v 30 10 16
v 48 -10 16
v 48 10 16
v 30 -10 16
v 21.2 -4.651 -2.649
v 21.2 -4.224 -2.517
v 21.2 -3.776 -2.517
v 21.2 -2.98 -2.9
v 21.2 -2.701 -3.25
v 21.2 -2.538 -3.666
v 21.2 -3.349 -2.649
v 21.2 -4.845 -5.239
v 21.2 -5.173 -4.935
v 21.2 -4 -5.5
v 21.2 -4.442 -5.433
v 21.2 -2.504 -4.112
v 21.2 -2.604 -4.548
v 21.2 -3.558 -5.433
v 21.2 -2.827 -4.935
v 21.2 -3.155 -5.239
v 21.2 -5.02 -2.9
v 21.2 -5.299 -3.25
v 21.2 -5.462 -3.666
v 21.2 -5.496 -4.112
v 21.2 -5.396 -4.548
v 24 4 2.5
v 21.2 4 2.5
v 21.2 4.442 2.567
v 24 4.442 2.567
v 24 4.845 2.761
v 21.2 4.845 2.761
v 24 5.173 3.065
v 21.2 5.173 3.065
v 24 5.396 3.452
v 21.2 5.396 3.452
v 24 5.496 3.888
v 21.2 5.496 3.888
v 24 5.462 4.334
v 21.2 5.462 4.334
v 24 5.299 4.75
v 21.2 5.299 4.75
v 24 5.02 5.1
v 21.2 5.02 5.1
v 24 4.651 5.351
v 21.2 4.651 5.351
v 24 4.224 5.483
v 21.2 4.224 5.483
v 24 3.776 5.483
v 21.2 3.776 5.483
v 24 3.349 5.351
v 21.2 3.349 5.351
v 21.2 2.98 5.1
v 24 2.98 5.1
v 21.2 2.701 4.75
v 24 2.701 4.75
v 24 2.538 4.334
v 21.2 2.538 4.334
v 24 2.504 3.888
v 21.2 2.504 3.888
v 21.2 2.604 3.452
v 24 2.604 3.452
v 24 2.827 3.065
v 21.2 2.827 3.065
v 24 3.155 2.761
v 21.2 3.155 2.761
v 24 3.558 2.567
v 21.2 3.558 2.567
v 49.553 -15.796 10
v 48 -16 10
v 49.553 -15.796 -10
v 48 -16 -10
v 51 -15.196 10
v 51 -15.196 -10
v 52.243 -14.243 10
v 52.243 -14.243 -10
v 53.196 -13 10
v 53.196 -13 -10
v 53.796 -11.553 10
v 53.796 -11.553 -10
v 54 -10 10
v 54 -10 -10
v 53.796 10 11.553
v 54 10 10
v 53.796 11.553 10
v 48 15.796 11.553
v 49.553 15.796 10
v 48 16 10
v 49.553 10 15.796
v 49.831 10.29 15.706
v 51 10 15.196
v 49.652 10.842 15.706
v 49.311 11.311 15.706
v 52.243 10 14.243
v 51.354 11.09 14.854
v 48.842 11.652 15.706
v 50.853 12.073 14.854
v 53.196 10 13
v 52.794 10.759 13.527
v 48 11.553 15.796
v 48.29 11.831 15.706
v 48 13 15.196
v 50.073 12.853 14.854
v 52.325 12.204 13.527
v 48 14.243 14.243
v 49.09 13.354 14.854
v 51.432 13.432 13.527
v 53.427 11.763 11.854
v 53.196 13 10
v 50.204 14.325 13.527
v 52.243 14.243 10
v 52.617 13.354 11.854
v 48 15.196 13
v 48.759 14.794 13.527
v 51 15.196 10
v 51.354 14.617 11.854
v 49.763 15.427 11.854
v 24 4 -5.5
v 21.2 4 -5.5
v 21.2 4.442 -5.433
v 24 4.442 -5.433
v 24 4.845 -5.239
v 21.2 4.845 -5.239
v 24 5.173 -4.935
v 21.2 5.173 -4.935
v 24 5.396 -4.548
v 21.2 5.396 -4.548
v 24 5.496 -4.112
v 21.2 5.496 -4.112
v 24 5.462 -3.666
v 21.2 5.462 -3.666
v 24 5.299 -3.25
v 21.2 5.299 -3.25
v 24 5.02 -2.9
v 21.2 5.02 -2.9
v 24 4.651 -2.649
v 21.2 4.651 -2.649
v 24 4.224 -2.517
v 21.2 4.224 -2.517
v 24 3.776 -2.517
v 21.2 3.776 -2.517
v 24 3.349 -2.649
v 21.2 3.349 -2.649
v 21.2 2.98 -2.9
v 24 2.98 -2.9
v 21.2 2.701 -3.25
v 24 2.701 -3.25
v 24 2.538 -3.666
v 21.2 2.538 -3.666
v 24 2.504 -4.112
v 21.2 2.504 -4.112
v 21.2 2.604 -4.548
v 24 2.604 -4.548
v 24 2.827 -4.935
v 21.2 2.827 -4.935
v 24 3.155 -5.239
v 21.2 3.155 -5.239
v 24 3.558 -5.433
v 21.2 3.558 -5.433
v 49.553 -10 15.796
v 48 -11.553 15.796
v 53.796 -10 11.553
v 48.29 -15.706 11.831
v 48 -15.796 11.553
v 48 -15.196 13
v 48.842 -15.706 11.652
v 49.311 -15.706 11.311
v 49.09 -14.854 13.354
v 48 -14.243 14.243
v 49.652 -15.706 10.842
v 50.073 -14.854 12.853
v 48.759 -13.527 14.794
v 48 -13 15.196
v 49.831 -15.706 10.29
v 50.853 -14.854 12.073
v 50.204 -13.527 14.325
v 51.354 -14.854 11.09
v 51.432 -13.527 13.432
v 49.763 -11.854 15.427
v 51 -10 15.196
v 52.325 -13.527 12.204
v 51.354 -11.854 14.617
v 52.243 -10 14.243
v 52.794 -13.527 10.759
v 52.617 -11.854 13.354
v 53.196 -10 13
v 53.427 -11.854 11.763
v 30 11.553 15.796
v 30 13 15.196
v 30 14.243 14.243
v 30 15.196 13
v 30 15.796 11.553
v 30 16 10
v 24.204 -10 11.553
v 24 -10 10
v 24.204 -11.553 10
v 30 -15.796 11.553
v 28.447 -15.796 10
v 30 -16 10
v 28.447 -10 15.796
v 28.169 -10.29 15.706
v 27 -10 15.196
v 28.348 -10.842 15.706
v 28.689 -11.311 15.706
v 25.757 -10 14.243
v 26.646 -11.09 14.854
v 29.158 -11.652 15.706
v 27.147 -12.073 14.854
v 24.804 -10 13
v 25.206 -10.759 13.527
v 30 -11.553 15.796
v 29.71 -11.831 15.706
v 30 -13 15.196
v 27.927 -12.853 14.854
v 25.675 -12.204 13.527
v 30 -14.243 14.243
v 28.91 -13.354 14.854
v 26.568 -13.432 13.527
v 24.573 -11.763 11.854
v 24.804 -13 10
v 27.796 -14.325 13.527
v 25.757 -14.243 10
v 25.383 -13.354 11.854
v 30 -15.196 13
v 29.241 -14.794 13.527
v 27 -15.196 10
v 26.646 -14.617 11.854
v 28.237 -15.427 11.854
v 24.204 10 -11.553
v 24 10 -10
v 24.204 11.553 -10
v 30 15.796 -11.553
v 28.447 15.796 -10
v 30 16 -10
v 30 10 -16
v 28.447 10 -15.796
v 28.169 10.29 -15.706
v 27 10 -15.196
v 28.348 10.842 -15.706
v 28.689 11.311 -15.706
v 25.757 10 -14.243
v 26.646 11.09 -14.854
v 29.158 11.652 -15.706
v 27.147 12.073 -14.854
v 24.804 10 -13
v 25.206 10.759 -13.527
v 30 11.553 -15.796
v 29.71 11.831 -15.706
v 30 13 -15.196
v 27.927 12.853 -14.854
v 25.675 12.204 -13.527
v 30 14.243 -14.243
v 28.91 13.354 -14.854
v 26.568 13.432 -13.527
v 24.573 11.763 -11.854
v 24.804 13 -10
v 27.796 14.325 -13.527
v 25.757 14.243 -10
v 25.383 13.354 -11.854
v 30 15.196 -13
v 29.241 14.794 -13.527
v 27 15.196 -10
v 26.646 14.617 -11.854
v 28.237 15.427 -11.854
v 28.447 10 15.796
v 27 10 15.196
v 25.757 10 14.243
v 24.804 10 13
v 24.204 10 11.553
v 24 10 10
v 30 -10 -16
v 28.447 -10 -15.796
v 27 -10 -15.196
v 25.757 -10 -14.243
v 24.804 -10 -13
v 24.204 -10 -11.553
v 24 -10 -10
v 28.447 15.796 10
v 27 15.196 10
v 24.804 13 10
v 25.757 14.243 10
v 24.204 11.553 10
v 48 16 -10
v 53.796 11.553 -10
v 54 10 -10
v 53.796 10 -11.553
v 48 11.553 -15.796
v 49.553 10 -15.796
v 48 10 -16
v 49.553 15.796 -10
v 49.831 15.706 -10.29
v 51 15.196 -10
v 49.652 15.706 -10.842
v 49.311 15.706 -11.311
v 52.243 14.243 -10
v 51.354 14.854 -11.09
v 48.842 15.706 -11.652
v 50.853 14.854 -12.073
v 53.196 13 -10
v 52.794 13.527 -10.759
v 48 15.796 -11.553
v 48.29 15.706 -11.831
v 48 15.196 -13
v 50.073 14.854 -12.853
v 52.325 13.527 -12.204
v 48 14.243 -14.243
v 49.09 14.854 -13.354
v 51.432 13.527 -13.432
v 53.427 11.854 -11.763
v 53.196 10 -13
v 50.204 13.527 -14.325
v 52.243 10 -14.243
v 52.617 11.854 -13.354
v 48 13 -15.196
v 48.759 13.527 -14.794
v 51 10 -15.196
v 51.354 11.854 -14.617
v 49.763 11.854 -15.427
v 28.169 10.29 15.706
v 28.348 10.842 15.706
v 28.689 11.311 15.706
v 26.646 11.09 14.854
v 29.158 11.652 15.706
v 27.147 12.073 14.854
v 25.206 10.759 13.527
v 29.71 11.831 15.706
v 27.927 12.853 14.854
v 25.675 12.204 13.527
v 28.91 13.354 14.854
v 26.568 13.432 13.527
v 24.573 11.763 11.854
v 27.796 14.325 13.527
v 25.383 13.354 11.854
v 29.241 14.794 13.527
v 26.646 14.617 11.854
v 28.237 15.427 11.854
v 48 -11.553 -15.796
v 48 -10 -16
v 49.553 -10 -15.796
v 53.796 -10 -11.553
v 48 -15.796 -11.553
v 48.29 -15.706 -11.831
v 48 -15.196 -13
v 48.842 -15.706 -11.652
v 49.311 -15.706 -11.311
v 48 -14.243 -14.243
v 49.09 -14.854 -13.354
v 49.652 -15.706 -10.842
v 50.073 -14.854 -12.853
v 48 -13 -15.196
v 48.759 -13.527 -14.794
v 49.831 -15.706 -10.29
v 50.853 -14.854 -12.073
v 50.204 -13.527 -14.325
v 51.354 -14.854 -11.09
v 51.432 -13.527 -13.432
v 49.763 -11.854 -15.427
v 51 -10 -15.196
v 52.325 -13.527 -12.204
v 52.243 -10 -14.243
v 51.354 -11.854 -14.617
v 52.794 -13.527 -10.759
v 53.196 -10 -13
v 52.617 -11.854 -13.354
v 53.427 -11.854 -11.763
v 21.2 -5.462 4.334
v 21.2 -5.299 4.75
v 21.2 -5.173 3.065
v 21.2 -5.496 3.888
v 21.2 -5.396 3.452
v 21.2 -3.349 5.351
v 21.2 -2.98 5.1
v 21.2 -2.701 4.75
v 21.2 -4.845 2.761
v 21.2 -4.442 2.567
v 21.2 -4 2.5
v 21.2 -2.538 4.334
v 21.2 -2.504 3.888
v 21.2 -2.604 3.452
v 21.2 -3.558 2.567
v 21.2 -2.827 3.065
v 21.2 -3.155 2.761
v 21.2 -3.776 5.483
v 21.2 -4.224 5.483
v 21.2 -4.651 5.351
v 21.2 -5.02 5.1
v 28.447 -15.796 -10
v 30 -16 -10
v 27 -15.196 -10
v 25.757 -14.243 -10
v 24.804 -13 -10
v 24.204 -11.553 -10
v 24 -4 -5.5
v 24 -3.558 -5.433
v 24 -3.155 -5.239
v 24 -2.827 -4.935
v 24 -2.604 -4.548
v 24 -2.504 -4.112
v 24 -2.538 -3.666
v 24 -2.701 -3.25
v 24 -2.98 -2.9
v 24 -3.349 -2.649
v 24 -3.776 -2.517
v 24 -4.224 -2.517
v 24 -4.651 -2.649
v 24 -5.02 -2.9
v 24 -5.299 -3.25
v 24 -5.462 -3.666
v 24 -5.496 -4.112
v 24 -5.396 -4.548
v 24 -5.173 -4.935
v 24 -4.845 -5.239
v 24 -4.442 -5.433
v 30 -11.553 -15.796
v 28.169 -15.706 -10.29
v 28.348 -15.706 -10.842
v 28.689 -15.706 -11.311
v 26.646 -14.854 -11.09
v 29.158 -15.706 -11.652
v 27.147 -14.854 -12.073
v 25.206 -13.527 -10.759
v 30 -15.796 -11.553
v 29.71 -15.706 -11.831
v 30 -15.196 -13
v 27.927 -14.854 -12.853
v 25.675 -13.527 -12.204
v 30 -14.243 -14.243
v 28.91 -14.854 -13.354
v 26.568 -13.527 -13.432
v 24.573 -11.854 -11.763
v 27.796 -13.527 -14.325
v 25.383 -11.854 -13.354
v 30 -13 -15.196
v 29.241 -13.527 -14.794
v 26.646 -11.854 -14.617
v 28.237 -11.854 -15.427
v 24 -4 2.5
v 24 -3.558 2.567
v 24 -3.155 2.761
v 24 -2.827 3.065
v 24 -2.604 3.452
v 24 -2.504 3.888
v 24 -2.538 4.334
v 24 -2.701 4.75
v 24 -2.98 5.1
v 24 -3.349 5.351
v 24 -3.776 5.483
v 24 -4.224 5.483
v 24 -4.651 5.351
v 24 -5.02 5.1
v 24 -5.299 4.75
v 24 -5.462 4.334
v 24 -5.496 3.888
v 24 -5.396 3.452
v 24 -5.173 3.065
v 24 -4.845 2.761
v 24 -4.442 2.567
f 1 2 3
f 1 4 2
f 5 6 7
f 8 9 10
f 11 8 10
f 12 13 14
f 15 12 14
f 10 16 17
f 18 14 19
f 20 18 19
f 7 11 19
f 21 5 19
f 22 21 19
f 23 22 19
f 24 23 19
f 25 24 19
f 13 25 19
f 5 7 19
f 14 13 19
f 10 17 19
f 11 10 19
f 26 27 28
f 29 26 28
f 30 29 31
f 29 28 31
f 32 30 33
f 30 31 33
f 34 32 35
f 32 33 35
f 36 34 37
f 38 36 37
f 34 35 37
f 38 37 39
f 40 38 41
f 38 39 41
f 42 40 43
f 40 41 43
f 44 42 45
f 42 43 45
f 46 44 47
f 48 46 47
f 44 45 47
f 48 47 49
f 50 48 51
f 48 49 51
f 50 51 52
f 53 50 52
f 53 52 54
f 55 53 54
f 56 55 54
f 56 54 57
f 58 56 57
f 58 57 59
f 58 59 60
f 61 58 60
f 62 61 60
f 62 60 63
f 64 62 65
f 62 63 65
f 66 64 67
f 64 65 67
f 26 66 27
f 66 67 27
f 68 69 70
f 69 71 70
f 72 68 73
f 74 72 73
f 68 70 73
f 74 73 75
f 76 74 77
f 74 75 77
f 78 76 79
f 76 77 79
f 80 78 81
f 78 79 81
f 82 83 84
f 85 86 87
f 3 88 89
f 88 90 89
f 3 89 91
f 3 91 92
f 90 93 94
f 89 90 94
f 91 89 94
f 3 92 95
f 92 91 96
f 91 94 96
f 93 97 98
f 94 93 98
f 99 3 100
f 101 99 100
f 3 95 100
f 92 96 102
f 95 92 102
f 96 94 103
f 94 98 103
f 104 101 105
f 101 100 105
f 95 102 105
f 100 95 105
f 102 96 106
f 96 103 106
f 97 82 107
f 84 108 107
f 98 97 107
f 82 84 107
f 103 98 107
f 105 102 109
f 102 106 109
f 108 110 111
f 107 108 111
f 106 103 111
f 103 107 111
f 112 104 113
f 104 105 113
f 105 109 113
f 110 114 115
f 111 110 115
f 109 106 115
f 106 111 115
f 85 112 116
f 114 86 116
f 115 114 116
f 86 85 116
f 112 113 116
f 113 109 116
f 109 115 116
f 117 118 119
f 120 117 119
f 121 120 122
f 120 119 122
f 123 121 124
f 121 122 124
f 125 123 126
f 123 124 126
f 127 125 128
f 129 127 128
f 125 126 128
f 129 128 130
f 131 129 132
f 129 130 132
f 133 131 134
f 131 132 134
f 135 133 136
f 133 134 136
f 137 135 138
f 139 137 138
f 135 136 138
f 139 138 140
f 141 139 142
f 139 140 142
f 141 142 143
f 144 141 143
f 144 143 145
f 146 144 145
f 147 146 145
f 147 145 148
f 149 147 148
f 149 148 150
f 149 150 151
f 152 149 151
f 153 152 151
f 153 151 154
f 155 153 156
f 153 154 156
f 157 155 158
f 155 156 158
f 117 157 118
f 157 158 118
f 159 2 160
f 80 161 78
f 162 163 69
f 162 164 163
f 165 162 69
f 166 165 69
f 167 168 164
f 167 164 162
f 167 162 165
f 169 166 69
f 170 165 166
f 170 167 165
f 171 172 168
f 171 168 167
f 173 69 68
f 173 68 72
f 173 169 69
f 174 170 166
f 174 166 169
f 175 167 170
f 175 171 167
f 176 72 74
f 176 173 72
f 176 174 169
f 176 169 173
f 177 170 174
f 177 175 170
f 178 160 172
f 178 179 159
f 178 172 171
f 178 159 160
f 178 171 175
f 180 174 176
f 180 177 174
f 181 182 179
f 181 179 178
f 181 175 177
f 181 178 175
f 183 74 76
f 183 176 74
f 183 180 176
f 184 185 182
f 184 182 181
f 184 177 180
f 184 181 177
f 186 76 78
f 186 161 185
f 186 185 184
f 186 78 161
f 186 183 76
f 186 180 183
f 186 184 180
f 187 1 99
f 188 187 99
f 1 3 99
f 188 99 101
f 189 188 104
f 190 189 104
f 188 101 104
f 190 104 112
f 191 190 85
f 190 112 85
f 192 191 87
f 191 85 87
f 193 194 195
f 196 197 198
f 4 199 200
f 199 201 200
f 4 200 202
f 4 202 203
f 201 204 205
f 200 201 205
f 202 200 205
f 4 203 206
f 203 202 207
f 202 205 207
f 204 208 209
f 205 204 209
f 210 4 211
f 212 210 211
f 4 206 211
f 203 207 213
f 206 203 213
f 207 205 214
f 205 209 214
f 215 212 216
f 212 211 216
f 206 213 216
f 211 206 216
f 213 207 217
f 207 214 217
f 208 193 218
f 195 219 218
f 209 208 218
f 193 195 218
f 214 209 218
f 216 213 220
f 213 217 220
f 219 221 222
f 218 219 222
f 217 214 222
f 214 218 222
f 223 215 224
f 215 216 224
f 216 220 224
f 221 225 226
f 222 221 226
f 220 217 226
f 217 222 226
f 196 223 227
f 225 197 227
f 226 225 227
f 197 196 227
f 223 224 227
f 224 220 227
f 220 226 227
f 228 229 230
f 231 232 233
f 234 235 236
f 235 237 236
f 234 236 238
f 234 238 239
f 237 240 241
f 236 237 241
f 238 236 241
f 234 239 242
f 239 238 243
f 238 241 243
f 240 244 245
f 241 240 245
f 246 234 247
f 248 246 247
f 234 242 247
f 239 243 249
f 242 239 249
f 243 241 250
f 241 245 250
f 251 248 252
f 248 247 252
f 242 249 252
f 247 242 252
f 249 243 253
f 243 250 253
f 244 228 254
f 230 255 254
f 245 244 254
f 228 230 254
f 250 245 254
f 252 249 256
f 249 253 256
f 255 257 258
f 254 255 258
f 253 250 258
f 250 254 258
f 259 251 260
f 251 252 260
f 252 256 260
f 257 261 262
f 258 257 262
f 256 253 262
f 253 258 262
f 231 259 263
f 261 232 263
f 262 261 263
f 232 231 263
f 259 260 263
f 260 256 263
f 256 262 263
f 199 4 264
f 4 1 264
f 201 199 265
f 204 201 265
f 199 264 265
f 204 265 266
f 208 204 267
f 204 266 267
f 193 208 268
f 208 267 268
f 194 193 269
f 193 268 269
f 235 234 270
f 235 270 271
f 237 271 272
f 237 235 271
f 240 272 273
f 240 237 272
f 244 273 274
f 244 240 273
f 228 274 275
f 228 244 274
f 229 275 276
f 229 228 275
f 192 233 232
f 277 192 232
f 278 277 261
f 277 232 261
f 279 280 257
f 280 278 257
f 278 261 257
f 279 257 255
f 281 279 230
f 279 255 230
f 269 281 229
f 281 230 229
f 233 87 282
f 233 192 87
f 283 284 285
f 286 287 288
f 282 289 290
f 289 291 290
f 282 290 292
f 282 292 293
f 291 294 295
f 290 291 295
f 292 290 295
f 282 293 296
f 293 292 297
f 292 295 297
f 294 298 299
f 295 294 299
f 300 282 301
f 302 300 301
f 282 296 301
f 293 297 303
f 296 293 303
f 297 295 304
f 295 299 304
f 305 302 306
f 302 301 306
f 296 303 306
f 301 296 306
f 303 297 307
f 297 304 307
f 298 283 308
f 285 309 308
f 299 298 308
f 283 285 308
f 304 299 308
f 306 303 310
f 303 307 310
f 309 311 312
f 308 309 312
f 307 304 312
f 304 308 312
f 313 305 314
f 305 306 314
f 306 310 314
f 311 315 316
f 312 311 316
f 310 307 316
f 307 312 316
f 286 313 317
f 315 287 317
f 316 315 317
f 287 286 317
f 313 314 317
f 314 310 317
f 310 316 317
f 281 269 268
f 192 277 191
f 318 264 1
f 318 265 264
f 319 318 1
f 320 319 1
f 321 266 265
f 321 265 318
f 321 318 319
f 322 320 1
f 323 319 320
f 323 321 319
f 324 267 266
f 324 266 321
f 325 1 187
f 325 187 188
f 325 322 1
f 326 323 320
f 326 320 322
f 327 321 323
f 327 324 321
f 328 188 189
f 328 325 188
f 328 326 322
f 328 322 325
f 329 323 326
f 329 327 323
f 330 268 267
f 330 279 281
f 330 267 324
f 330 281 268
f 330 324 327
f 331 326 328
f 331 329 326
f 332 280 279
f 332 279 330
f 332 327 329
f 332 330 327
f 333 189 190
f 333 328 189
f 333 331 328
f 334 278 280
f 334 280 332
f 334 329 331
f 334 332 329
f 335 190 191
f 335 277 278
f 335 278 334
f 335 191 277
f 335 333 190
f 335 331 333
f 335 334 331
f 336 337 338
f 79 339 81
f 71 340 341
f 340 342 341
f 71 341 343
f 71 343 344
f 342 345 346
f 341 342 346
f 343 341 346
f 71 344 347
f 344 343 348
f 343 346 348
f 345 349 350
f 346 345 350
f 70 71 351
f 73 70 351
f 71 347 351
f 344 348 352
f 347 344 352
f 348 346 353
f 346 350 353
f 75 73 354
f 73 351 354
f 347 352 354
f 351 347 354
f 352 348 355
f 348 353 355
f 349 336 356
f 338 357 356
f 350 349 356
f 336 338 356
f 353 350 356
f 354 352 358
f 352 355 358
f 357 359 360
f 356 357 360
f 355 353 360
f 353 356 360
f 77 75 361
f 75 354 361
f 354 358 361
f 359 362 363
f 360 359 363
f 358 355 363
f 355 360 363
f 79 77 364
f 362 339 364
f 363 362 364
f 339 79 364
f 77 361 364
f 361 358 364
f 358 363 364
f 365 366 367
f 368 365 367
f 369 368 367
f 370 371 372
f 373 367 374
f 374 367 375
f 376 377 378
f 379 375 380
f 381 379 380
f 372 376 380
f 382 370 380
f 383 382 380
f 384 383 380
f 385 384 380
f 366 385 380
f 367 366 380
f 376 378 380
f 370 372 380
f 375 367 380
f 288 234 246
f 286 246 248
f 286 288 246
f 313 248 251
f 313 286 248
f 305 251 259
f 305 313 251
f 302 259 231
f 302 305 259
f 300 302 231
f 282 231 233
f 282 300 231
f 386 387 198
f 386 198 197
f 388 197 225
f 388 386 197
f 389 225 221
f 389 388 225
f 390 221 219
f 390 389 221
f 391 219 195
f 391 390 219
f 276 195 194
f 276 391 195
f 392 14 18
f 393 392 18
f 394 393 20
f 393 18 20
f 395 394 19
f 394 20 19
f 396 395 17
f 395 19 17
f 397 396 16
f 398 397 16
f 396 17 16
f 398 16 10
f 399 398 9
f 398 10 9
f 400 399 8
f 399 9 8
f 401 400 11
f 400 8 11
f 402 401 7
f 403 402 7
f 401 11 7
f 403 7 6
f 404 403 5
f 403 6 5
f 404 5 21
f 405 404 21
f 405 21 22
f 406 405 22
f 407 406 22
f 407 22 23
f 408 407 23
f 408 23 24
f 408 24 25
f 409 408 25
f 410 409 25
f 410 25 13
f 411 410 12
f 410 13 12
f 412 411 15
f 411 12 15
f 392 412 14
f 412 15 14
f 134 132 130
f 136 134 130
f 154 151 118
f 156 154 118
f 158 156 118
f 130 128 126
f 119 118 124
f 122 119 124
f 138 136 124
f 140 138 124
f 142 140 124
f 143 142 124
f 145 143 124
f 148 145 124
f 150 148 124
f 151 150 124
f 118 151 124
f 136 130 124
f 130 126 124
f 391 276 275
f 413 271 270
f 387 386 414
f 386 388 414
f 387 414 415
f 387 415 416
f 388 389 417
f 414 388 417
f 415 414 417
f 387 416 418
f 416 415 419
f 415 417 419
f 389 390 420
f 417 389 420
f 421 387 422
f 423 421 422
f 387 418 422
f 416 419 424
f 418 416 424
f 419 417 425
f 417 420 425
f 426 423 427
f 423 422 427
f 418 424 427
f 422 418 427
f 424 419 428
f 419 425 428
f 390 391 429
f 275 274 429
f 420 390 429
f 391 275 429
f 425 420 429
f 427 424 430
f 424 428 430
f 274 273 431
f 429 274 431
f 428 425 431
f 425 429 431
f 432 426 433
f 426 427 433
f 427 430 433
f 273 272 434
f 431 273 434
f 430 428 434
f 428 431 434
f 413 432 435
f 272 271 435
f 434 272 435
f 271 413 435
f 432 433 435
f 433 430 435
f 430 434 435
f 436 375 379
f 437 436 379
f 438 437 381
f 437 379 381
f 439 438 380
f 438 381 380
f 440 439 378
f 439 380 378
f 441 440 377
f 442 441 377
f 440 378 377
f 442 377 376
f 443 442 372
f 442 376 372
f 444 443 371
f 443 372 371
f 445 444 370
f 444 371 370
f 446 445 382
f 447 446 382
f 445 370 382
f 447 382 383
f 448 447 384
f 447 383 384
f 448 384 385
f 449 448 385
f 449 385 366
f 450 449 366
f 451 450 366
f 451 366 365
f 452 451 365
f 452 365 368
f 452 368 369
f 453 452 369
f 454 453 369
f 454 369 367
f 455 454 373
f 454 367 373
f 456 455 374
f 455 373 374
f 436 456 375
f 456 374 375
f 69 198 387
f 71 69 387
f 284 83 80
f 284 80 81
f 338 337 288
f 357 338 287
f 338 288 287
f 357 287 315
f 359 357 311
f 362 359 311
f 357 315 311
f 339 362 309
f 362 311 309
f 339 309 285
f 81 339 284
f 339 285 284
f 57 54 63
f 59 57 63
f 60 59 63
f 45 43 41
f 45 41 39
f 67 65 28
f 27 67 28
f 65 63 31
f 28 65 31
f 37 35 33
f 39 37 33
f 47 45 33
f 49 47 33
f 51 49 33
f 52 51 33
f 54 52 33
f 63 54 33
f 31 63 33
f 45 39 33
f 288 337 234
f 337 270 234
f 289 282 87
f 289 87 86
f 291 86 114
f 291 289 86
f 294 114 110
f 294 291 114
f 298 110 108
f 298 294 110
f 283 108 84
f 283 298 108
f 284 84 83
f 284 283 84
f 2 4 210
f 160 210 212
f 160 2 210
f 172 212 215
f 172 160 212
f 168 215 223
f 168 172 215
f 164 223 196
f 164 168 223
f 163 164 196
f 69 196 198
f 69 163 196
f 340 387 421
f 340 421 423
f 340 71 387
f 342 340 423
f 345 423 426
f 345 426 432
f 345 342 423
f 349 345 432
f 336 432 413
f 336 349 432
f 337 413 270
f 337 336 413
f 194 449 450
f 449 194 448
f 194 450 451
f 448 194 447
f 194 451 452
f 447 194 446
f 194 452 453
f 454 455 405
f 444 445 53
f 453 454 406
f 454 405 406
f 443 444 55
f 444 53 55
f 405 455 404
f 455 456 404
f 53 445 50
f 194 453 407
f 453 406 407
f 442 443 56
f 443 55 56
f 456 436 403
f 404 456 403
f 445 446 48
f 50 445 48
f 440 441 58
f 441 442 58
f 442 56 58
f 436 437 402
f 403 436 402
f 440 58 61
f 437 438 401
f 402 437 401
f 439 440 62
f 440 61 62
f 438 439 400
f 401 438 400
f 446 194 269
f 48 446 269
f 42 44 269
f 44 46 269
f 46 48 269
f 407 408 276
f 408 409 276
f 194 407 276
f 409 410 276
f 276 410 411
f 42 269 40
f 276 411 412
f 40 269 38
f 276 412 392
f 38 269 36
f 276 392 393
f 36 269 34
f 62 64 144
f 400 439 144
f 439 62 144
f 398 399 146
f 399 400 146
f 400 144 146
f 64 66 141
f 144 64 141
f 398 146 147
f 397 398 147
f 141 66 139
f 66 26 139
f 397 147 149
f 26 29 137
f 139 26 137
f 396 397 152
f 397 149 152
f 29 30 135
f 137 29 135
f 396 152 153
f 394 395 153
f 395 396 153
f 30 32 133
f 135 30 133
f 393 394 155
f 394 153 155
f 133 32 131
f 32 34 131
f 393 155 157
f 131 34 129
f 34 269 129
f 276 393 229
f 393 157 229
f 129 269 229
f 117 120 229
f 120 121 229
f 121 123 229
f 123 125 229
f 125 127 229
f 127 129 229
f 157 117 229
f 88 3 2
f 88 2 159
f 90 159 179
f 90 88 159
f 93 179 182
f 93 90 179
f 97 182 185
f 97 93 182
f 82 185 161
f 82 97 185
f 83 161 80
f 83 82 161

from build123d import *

# Parameters (mm, degrees)
SKETCH1_W           = 32
SKETCH1_H           = 32
BOSS_EXTRUDE1_DEPTH = 30
FILLET1_R           = 6
SKETCH2_R           = 1.5
BOSS_EXTRUDE2_DEPTH = 2.8


with BuildPart() as part:
    # Sketch1 → Boss-Extrude1 (new body)
    with BuildSketch(Plane(origin=(24, 0, 0), x_dir=(0, 0, -1), z_dir=(1, 0, 0))):
        Rectangle(SKETCH1_W, SKETCH1_H)
    extrude(amount=BOSS_EXTRUDE1_DEPTH)

    # Fillet1
    fillet1_edges = [part.edges().sort_by_distance(p)[0] for p in [
        (54, 0, -16),
        (54, 16, 0),
        (54, 0, 16),
        (24, 16, 0),
        (24, 0, -16),
        (24, -16, 0),
        (24, 0, 16),
        (39, 16, 16),
        (39, 16, -16),
        (39, -16, -16),
        (39, -16, 16),
        (54, -16, 0),
    ]]
    fillet(fillet1_edges, radius=FILLET1_R)

    # Sketch2 → Boss-Extrude2 (add)
    with BuildSketch(Plane(origin=(21.2, 0, 0), x_dir=(0, 0, -1), z_dir=(1, 0, 0))):
        with Locations((-4, -4)):
            Circle(SKETCH2_R)
        with Locations((4, -4)):
            Circle(SKETCH2_R)
        with Locations((-4, 4)):
            Circle(SKETCH2_R)
        with Locations((4, 4)):
            Circle(SKETCH2_R)
    extrude(amount=BOSS_EXTRUDE2_DEPTH)


solid = part.part
